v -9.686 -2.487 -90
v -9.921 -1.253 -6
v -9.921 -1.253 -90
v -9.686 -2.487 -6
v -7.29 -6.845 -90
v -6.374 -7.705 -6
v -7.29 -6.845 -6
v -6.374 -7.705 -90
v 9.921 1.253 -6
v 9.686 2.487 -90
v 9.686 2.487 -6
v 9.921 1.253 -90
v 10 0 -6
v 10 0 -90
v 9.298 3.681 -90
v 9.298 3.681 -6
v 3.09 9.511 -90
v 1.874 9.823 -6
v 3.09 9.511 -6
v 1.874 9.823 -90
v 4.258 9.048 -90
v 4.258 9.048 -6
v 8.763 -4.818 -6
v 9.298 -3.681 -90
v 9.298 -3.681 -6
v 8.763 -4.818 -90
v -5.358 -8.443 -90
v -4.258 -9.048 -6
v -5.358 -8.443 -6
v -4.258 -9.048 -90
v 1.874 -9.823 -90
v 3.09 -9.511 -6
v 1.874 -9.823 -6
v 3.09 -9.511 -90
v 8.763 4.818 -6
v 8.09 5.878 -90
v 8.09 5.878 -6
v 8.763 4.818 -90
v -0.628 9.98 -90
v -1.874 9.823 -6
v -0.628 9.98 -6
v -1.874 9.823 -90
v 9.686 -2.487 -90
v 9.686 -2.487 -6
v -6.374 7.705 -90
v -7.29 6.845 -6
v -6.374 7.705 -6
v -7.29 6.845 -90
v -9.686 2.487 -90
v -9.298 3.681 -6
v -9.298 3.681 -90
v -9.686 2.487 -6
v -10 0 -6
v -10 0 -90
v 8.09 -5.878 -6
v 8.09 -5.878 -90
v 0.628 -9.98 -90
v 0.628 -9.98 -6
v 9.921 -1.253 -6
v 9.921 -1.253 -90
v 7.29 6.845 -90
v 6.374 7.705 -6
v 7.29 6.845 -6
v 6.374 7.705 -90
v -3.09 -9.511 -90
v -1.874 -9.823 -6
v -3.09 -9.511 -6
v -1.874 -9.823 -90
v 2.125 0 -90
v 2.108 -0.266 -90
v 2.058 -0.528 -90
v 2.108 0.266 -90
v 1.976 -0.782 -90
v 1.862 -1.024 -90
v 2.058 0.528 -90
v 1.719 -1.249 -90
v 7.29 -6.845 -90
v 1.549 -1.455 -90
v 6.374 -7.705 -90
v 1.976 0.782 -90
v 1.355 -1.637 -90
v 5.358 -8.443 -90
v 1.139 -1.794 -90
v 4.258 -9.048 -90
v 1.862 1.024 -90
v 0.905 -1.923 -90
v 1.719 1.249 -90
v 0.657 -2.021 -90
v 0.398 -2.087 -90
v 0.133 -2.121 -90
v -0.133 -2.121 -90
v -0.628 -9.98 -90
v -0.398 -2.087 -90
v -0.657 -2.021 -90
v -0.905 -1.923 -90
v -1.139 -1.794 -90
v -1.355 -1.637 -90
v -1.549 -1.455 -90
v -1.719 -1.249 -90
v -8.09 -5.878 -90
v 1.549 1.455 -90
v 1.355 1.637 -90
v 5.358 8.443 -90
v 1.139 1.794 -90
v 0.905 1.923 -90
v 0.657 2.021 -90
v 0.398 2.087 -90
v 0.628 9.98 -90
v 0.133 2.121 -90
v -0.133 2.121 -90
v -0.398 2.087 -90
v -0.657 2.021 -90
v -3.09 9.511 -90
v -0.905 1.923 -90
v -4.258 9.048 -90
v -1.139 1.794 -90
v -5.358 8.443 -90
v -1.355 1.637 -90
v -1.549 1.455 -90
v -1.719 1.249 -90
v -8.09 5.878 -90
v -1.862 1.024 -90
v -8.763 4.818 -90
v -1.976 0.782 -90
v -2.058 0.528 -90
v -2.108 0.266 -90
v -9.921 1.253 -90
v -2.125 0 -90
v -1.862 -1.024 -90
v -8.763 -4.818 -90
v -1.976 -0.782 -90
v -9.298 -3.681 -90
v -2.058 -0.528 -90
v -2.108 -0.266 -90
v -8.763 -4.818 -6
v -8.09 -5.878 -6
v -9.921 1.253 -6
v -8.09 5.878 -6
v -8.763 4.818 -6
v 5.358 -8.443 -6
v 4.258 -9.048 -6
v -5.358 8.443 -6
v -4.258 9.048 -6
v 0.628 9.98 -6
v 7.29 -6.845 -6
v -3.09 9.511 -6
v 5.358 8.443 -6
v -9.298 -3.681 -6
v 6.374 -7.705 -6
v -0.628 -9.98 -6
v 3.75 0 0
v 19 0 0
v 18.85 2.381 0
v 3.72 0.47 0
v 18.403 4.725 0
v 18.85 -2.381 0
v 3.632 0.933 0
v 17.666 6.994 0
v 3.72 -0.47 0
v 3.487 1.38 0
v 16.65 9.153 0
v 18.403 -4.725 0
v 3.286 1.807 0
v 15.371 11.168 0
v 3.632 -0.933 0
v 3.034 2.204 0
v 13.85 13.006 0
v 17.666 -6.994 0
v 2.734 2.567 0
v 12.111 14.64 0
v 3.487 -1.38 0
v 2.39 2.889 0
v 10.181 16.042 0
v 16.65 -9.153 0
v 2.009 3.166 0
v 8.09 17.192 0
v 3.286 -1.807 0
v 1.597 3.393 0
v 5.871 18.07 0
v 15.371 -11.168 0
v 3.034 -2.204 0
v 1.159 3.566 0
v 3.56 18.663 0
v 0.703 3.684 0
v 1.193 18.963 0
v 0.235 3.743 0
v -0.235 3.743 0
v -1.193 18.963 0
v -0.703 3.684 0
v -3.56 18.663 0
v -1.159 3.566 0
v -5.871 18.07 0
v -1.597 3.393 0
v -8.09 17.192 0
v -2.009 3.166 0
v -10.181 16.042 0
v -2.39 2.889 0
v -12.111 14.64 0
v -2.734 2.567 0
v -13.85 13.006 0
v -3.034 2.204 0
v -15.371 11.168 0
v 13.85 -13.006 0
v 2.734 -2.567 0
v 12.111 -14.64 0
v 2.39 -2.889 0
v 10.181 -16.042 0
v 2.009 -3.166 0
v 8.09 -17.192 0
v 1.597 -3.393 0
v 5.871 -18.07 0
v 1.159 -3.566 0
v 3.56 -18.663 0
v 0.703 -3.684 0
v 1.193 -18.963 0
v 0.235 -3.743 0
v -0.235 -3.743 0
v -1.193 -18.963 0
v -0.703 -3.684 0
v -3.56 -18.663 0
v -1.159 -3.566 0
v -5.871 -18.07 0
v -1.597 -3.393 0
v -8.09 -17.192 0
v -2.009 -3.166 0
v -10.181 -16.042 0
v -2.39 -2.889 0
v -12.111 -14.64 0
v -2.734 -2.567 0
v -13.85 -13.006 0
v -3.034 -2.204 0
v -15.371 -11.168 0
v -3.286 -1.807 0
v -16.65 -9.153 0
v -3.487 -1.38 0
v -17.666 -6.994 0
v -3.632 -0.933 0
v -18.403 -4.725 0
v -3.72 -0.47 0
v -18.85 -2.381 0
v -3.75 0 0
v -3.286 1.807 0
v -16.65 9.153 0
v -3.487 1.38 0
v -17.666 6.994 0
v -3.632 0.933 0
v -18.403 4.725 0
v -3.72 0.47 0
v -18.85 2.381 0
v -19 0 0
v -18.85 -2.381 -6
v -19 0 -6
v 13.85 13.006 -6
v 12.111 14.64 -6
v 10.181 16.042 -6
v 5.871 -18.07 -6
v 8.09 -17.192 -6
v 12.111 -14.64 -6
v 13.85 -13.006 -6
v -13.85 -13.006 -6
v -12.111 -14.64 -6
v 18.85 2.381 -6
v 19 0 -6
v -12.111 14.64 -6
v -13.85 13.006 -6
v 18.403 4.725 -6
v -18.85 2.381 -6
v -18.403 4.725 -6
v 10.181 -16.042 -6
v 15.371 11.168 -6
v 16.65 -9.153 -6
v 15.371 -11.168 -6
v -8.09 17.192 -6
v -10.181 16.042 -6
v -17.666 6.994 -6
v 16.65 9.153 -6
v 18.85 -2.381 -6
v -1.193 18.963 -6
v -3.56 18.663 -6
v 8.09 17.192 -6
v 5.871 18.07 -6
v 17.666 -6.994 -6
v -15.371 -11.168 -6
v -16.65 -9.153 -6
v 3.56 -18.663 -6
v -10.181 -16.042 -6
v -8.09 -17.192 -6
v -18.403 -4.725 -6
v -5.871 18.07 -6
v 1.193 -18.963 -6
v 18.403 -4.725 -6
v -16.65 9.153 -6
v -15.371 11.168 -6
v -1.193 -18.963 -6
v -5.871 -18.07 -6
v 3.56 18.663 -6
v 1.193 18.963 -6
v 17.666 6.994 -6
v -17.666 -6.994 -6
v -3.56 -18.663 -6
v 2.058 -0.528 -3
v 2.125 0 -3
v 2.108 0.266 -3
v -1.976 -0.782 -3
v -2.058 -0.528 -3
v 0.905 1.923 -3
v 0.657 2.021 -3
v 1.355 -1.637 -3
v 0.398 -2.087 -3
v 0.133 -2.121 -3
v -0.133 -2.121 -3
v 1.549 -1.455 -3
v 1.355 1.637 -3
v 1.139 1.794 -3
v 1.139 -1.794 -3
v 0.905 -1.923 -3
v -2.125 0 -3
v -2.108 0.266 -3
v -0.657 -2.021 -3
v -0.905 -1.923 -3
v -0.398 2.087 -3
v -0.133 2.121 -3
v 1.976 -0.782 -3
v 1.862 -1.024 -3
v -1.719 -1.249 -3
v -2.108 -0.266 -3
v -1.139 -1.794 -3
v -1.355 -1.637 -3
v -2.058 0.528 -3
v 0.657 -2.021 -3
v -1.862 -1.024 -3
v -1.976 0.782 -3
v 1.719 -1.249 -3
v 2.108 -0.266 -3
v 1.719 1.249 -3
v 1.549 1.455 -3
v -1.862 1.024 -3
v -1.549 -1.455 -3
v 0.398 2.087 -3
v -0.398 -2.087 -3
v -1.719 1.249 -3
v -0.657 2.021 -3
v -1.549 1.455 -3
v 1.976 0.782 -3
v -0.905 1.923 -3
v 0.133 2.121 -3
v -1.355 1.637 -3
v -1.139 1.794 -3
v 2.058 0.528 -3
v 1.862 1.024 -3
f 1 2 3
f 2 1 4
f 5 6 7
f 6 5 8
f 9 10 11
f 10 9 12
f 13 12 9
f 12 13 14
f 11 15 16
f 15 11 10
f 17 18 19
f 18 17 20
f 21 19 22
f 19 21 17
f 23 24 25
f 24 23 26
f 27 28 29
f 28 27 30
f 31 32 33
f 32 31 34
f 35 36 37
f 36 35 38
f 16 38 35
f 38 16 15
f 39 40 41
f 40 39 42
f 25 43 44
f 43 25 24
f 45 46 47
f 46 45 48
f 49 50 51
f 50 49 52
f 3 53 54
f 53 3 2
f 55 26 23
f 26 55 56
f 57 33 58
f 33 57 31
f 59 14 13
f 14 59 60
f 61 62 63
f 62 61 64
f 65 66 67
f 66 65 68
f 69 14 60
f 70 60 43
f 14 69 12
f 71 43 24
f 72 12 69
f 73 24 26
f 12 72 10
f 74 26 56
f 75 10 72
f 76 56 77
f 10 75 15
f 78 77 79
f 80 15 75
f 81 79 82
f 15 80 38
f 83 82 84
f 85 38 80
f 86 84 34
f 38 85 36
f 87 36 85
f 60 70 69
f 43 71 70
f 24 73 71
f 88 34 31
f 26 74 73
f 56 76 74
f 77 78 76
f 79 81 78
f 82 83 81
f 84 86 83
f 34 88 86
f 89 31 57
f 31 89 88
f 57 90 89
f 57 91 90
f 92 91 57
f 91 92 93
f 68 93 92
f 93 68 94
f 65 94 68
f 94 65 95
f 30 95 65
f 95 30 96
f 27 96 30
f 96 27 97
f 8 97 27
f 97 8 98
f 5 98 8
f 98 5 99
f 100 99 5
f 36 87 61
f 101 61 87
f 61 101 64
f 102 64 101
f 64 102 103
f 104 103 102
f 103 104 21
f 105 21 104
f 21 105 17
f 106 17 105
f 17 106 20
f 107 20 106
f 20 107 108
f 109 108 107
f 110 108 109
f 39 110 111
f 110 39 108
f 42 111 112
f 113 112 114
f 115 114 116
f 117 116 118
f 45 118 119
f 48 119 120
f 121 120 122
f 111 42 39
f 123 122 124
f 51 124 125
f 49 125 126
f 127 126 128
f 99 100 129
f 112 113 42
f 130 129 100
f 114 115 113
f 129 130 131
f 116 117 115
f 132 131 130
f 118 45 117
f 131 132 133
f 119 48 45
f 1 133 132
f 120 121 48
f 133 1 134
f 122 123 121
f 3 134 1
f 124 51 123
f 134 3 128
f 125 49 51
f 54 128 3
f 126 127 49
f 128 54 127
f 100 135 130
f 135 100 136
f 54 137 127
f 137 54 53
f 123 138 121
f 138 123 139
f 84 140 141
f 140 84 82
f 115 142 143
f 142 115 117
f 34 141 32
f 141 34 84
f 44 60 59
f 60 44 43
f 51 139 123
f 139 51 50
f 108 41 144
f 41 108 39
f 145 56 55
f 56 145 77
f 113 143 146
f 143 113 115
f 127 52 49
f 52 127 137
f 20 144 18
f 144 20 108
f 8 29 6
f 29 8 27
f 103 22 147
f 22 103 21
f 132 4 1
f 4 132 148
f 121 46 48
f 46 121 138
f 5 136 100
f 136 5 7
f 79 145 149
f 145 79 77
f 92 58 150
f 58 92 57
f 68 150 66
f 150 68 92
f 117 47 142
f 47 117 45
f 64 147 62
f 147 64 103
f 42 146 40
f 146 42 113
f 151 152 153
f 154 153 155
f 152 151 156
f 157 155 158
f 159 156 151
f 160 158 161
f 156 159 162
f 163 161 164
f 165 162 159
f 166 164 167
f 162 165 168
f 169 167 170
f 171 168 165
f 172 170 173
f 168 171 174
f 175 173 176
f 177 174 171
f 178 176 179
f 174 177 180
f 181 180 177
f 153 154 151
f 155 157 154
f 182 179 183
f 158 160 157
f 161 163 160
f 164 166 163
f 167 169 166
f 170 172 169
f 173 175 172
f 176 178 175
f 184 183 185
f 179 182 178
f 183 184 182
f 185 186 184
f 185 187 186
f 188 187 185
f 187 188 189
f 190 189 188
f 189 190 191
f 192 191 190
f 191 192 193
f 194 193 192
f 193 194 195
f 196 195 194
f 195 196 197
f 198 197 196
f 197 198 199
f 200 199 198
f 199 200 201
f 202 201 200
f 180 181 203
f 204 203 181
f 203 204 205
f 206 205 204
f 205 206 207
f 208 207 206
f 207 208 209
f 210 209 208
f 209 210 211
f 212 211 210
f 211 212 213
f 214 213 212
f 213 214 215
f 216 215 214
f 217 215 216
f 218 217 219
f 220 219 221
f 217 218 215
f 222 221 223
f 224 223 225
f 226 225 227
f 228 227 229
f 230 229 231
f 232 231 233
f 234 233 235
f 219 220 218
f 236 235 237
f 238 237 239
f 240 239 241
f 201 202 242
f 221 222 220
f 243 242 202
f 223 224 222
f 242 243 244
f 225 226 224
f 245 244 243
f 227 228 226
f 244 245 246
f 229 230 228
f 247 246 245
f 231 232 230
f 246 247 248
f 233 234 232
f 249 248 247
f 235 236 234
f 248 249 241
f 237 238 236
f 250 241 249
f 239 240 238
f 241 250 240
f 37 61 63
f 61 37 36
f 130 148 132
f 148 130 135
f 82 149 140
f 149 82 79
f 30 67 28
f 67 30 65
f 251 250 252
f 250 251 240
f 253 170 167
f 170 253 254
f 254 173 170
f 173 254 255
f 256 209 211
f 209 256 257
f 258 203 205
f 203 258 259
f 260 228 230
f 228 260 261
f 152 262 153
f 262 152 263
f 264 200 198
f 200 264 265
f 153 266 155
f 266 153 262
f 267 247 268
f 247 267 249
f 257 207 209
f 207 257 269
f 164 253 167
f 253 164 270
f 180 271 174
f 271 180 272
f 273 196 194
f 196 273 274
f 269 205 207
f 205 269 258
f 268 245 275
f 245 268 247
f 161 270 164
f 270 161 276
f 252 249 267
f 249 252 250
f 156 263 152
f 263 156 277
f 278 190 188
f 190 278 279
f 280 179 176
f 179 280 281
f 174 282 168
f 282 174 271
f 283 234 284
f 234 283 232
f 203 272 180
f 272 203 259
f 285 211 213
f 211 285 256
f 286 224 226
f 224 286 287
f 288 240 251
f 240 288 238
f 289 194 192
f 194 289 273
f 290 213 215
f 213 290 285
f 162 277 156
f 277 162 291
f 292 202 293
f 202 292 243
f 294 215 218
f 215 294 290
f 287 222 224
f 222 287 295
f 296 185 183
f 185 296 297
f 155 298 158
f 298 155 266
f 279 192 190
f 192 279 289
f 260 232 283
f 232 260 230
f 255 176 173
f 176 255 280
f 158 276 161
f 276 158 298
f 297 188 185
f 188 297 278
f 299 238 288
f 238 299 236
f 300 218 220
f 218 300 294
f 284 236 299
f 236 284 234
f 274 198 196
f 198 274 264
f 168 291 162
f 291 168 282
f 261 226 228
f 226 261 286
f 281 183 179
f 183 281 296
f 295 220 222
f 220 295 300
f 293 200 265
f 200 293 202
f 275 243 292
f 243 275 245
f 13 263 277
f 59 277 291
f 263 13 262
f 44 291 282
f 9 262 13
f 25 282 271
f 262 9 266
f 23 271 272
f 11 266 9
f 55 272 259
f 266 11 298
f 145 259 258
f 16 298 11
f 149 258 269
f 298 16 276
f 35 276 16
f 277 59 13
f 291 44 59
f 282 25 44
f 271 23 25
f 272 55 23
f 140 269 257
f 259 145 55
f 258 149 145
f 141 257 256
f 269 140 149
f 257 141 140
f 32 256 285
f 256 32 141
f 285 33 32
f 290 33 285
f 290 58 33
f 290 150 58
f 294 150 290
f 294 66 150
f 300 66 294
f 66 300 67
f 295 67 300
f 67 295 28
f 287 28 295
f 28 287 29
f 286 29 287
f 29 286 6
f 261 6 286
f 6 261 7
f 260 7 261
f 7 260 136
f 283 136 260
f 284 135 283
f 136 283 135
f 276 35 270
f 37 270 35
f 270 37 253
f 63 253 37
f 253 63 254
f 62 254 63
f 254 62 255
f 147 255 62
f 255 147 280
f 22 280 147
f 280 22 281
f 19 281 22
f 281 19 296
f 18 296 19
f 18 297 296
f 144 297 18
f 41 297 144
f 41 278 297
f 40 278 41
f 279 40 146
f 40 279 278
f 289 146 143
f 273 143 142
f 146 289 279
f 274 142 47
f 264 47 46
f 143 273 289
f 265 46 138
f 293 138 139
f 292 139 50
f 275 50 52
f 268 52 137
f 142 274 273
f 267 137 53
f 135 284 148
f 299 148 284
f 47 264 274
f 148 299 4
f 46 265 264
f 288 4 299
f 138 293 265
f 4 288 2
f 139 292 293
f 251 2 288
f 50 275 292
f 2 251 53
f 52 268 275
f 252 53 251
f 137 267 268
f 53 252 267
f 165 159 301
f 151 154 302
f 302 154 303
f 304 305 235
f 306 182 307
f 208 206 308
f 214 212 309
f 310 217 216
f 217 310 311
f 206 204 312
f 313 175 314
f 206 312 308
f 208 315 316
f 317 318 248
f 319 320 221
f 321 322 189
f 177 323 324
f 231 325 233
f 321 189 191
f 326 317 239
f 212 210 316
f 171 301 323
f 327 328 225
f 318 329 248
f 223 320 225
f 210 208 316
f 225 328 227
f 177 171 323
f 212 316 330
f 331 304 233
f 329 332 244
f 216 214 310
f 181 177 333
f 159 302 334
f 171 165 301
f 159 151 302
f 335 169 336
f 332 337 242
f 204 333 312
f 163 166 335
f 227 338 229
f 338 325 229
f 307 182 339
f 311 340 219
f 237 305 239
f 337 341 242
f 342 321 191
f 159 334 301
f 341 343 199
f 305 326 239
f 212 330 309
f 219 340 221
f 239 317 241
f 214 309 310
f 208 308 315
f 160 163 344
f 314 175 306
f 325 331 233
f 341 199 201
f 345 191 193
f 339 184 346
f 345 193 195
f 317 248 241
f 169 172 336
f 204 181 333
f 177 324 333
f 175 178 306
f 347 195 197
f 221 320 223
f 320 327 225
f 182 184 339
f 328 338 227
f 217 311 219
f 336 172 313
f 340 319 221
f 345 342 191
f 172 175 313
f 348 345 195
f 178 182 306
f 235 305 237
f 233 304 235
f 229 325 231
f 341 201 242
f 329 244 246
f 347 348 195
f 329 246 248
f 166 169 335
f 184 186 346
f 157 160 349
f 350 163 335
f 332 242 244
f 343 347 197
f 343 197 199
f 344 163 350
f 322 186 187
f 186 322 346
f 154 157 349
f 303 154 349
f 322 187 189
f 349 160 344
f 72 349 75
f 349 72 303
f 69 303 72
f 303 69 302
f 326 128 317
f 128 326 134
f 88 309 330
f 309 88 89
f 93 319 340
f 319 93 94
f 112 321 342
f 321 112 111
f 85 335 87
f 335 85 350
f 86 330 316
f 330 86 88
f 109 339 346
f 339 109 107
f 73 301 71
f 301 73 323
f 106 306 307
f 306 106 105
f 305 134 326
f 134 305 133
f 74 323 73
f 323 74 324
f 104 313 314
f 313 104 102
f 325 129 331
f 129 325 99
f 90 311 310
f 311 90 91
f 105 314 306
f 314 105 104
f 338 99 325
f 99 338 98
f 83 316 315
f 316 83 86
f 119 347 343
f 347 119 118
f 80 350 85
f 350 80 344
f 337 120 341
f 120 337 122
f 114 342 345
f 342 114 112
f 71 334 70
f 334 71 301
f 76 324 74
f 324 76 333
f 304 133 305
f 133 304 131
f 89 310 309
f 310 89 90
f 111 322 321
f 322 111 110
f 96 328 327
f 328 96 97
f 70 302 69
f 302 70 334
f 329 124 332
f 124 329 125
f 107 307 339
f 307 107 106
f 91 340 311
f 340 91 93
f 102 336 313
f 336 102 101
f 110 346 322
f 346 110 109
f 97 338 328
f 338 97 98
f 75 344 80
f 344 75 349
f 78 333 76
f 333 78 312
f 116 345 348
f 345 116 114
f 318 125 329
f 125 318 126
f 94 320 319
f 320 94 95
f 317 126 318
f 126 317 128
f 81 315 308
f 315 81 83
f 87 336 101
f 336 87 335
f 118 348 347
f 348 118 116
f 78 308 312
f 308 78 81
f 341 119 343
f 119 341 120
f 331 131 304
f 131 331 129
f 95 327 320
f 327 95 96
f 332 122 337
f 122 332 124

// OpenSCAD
$fn = 50;


difference() {
	union() {
		translate(v = [0, 0, -90.0000000000]) {
			cylinder(h = 90, r = 10.0000000000);
		}
		translate(v = [0, 0, -6.0000000000]) {
			cylinder(h = 6, r = 19.0000000000);
		}
	}
	union() {
		translate(v = [0, 0, 0]) {
			rotate(a = [0, 0, 0]) {
				difference() {
					union() {
						#translate(v = [0, 0, -90.0000000000]) {
							cylinder(h = 90, r = 2.0000000000);
						}
						#translate(v = [0, 0, -3]) {
							cylinder(h = 3, r = 10.0000000000, r1 = 2.1250000000, r2 = 3.7500000000);
						}
						#translate(v = [0, 0, -90.0000000000]) {
							cylinder(h = 90, r = 2.1250000000);
						}
						#translate(v = [0, 0, -90.0000000000]) {
							cylinder(h = 90, r = 2.0000000000);
						}
					}
					union();
				}
			}
		}
	}
}
